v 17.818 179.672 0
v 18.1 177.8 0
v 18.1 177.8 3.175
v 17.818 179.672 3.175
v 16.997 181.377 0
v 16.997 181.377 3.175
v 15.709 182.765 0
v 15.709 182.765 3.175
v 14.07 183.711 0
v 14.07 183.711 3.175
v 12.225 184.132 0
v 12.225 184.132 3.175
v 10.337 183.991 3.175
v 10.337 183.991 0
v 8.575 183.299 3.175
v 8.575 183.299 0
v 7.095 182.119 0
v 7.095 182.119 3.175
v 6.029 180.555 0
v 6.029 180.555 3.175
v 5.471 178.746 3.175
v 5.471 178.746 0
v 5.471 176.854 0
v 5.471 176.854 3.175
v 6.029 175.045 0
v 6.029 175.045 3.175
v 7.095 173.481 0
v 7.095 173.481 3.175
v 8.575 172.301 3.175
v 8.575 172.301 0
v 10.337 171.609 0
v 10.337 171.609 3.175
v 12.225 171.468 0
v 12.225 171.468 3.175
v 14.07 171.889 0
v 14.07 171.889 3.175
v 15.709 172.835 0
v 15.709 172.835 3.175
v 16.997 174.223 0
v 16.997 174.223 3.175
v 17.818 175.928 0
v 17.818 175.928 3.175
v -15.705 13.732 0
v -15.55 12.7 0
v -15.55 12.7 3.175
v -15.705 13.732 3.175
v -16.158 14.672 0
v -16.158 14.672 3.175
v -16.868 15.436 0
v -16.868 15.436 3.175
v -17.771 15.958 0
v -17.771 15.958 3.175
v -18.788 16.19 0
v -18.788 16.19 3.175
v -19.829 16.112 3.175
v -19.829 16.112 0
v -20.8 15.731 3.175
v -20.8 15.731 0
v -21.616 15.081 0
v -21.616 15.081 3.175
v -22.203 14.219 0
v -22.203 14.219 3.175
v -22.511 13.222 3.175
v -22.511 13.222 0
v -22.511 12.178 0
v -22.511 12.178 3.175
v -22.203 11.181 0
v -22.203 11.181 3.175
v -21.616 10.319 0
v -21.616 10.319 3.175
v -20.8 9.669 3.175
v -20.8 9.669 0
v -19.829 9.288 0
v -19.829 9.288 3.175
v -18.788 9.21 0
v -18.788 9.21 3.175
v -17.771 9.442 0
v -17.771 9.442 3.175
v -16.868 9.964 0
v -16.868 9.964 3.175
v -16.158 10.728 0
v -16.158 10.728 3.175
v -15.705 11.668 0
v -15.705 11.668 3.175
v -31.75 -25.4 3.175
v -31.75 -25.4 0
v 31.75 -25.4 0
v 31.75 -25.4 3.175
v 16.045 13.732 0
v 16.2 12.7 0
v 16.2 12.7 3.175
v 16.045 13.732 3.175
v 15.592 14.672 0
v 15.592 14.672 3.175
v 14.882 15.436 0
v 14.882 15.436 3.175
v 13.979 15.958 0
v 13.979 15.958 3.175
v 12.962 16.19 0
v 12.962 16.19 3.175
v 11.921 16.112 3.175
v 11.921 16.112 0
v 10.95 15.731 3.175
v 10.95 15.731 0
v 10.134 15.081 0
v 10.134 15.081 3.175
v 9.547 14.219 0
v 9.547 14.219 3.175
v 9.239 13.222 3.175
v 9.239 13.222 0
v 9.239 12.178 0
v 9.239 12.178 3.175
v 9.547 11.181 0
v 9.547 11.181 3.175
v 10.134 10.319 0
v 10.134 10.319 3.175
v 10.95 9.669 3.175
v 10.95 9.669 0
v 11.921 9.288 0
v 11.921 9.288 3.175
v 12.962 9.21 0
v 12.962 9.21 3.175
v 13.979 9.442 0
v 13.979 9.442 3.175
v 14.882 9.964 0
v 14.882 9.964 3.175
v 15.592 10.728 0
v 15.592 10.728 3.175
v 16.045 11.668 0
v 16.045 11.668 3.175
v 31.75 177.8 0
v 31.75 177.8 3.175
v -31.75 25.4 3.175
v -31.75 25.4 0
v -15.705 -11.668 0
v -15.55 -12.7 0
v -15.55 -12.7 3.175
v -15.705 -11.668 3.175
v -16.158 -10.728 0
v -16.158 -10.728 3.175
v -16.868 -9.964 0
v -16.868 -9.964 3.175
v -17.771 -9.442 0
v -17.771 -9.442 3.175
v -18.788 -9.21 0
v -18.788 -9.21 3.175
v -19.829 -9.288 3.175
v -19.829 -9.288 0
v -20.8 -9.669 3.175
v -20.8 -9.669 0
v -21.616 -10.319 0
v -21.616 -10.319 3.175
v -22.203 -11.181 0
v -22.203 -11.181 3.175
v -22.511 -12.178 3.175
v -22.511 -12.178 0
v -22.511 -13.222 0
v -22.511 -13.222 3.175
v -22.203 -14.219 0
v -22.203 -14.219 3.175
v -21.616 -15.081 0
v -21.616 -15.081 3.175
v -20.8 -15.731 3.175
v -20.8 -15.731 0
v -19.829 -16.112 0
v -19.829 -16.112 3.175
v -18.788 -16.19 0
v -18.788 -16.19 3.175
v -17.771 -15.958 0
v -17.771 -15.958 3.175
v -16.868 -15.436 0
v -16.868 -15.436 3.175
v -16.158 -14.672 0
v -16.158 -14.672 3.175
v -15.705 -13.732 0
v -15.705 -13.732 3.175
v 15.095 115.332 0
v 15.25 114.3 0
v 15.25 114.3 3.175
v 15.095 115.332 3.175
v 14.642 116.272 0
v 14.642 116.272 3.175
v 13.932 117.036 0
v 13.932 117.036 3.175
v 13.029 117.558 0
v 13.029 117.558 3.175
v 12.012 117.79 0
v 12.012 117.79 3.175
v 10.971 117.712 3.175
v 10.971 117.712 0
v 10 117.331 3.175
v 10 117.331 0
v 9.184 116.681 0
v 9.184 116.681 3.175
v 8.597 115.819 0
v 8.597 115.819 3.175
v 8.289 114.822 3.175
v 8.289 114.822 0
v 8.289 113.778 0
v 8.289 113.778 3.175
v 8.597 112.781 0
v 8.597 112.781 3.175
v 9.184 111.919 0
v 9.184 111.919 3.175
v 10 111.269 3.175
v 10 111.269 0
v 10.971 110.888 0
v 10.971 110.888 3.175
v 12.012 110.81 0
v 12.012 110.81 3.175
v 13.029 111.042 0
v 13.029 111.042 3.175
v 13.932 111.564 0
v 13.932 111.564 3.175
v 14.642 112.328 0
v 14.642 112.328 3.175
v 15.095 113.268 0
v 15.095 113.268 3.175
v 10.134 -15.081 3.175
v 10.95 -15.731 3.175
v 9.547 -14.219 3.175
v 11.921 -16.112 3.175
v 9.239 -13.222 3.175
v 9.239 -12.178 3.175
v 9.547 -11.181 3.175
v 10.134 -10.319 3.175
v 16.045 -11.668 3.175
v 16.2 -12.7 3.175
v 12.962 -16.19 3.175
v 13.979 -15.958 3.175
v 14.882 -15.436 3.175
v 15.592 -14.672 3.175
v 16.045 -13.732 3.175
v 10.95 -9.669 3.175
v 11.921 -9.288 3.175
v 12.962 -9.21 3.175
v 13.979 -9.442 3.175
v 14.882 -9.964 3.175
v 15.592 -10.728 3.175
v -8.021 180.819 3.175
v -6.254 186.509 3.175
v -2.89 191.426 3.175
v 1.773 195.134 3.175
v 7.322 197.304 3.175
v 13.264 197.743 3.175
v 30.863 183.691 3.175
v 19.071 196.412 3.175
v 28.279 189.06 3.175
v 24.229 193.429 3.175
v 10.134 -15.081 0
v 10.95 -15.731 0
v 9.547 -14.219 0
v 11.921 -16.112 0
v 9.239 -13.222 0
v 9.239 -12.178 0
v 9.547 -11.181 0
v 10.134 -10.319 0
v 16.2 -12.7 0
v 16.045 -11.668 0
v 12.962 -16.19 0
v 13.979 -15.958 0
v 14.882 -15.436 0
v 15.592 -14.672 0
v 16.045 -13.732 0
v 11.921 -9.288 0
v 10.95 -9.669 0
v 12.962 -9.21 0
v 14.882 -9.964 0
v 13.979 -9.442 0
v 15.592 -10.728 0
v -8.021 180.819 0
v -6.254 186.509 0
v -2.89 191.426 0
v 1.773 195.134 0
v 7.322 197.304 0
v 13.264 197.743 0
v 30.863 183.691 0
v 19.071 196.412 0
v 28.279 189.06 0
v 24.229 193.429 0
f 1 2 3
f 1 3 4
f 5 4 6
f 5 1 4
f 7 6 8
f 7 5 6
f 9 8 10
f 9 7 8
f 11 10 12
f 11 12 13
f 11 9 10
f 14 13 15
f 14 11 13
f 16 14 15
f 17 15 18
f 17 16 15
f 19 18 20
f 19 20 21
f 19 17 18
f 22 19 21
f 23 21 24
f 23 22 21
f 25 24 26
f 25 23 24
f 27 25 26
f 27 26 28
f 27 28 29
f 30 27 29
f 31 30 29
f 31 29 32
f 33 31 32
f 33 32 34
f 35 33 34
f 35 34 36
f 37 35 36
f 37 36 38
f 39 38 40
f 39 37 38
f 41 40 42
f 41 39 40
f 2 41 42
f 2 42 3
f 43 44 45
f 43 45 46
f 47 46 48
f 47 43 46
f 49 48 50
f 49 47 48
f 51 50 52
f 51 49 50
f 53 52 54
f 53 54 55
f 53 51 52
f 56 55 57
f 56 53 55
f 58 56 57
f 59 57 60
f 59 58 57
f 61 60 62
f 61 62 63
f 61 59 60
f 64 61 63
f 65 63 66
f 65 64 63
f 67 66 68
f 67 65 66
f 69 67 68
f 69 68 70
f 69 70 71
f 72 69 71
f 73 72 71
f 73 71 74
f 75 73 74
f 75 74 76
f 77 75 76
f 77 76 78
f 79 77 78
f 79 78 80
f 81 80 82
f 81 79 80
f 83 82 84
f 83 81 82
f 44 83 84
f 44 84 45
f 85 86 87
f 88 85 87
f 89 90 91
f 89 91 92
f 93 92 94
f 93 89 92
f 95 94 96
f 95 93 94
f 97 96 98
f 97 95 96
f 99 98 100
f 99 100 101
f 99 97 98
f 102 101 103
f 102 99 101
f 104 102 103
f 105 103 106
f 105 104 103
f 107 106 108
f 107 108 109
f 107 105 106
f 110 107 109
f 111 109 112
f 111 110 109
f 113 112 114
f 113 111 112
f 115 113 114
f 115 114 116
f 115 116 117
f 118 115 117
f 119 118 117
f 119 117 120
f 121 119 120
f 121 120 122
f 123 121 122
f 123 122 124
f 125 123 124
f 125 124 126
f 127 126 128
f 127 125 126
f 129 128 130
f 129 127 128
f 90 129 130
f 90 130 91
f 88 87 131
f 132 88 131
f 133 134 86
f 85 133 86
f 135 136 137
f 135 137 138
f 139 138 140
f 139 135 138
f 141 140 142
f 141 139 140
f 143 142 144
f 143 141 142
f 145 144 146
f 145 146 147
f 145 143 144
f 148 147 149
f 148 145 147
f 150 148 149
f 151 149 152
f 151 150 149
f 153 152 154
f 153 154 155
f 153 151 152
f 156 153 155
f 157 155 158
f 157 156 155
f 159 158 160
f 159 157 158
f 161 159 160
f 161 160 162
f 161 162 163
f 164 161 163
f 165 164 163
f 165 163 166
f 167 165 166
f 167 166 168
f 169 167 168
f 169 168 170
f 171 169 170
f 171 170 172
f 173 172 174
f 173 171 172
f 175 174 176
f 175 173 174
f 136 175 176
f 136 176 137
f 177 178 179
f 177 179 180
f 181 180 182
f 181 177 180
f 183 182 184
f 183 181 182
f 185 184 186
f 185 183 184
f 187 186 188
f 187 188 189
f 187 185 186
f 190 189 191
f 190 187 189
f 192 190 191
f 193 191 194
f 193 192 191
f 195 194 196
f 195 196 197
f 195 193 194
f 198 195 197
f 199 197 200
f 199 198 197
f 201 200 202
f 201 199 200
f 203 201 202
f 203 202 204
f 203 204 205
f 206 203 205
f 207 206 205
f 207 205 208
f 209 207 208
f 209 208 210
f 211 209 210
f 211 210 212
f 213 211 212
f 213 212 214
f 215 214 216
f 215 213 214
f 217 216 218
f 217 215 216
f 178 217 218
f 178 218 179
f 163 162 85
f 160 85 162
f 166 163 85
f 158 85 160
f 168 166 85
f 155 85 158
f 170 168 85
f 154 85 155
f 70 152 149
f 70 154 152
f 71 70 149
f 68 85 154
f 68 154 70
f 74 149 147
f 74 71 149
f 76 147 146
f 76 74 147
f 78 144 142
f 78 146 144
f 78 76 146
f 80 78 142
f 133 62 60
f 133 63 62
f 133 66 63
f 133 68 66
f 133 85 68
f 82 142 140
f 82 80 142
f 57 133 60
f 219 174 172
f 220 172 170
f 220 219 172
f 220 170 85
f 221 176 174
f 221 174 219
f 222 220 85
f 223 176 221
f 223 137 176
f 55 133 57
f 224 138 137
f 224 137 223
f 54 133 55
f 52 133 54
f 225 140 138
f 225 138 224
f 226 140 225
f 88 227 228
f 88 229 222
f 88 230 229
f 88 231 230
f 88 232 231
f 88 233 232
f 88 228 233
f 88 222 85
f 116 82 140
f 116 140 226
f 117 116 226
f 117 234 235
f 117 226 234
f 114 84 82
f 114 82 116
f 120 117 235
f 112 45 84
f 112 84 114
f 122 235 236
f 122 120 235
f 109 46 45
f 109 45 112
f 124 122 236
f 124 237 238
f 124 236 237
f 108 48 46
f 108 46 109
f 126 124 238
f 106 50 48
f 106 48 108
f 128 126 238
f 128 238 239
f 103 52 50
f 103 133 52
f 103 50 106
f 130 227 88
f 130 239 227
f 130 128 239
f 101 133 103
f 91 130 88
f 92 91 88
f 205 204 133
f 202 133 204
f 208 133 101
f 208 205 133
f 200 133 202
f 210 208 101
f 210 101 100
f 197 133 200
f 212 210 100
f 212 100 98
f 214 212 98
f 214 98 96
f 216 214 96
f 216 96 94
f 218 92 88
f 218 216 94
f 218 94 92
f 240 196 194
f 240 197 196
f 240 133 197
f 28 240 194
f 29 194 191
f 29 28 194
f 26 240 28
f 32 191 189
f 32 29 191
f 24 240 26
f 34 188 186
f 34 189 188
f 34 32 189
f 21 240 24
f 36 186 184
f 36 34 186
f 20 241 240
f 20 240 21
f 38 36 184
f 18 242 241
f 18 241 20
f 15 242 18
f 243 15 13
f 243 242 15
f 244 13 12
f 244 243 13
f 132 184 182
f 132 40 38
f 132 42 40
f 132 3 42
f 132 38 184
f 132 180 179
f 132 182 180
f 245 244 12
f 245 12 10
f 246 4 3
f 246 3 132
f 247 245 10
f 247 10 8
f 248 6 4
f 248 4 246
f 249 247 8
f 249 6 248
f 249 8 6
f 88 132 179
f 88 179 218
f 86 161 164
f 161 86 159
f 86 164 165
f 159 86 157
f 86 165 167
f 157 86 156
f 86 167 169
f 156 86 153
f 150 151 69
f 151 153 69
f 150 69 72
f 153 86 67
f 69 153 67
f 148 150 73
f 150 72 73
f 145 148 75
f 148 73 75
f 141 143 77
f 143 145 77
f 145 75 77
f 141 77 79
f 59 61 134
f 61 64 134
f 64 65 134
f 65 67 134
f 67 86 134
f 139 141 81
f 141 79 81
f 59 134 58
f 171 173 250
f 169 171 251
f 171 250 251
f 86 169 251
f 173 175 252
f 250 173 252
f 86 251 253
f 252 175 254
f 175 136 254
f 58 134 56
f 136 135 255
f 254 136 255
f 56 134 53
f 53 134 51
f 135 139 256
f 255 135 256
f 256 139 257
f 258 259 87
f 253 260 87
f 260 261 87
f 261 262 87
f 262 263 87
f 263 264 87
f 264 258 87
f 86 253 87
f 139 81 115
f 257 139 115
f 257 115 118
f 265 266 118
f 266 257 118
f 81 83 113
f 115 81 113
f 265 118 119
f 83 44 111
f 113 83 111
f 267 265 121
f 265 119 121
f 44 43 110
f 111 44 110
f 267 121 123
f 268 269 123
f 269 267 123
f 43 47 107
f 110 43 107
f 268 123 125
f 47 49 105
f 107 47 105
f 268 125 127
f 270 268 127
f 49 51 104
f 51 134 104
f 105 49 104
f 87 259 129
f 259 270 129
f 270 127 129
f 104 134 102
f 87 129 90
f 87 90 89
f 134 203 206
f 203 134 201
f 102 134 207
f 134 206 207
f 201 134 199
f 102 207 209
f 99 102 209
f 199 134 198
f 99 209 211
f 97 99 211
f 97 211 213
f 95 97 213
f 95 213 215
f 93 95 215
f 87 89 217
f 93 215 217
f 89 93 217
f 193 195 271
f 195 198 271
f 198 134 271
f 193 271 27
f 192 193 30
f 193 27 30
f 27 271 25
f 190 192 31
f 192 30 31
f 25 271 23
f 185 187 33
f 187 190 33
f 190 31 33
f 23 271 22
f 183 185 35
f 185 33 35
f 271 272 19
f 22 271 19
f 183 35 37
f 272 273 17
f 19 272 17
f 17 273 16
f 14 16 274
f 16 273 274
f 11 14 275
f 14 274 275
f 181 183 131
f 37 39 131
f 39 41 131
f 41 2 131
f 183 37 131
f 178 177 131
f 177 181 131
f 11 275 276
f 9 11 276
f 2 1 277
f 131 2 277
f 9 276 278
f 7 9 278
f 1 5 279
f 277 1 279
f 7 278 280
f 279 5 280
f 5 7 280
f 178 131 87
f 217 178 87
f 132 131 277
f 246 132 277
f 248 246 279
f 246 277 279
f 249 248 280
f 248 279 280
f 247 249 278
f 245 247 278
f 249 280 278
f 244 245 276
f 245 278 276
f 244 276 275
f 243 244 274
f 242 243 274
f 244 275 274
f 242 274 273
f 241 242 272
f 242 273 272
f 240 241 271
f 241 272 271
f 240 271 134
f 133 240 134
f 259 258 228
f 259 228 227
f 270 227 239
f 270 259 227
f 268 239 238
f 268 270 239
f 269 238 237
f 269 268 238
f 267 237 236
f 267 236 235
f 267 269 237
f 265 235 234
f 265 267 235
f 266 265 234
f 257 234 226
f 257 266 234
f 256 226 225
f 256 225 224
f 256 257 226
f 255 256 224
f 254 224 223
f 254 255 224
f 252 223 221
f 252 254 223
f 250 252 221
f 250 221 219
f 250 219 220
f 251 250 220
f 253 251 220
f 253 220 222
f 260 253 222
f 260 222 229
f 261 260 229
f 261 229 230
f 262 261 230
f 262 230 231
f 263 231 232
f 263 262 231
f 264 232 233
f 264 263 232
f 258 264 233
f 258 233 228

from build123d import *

# Parameters (mm, degrees)
SKETCH1_R           = 6.35
SKETCH1_R_2         = 3.5
BOSS_EXTRUDE1_DEPTH = 3.175


with BuildPart() as part:
    # Sketch1 → Boss-Extrude1 (new body)
    with BuildSketch(Plane.XY):
        with BuildLine():
            Line((-31.75, -25.4), (31.75, -25.4))
            Line((31.75, -25.4), (31.75, 177.8))
            ThreePointArc((31.75, 177.8), (13.263638058, 197.742640242), (-8.020889983, 180.818593926))
            Line((-8.020889983, 180.818593926), (-31.75, 25.4))
            Line((-31.75, 25.4), (-31.75, -25.4))
        make_face()
        with Locations((11.75, 177.8)):
            Circle(SKETCH1_R, mode=Mode.SUBTRACT)
        with Locations((-19.05, 12.7)):
            Circle(SKETCH1_R_2, mode=Mode.SUBTRACT)
        with Locations((12.7, 12.7)):
            Circle(SKETCH1_R_2, mode=Mode.SUBTRACT)
        with Locations((12.7, -12.7)):
            Circle(SKETCH1_R_2, mode=Mode.SUBTRACT)
        with Locations((-19.05, -12.7)):
            Circle(SKETCH1_R_2, mode=Mode.SUBTRACT)
        with Locations((11.75, 114.3)):
            Circle(SKETCH1_R_2, mode=Mode.SUBTRACT)
    extrude(amount=BOSS_EXTRUDE1_DEPTH)


solid = part.part
